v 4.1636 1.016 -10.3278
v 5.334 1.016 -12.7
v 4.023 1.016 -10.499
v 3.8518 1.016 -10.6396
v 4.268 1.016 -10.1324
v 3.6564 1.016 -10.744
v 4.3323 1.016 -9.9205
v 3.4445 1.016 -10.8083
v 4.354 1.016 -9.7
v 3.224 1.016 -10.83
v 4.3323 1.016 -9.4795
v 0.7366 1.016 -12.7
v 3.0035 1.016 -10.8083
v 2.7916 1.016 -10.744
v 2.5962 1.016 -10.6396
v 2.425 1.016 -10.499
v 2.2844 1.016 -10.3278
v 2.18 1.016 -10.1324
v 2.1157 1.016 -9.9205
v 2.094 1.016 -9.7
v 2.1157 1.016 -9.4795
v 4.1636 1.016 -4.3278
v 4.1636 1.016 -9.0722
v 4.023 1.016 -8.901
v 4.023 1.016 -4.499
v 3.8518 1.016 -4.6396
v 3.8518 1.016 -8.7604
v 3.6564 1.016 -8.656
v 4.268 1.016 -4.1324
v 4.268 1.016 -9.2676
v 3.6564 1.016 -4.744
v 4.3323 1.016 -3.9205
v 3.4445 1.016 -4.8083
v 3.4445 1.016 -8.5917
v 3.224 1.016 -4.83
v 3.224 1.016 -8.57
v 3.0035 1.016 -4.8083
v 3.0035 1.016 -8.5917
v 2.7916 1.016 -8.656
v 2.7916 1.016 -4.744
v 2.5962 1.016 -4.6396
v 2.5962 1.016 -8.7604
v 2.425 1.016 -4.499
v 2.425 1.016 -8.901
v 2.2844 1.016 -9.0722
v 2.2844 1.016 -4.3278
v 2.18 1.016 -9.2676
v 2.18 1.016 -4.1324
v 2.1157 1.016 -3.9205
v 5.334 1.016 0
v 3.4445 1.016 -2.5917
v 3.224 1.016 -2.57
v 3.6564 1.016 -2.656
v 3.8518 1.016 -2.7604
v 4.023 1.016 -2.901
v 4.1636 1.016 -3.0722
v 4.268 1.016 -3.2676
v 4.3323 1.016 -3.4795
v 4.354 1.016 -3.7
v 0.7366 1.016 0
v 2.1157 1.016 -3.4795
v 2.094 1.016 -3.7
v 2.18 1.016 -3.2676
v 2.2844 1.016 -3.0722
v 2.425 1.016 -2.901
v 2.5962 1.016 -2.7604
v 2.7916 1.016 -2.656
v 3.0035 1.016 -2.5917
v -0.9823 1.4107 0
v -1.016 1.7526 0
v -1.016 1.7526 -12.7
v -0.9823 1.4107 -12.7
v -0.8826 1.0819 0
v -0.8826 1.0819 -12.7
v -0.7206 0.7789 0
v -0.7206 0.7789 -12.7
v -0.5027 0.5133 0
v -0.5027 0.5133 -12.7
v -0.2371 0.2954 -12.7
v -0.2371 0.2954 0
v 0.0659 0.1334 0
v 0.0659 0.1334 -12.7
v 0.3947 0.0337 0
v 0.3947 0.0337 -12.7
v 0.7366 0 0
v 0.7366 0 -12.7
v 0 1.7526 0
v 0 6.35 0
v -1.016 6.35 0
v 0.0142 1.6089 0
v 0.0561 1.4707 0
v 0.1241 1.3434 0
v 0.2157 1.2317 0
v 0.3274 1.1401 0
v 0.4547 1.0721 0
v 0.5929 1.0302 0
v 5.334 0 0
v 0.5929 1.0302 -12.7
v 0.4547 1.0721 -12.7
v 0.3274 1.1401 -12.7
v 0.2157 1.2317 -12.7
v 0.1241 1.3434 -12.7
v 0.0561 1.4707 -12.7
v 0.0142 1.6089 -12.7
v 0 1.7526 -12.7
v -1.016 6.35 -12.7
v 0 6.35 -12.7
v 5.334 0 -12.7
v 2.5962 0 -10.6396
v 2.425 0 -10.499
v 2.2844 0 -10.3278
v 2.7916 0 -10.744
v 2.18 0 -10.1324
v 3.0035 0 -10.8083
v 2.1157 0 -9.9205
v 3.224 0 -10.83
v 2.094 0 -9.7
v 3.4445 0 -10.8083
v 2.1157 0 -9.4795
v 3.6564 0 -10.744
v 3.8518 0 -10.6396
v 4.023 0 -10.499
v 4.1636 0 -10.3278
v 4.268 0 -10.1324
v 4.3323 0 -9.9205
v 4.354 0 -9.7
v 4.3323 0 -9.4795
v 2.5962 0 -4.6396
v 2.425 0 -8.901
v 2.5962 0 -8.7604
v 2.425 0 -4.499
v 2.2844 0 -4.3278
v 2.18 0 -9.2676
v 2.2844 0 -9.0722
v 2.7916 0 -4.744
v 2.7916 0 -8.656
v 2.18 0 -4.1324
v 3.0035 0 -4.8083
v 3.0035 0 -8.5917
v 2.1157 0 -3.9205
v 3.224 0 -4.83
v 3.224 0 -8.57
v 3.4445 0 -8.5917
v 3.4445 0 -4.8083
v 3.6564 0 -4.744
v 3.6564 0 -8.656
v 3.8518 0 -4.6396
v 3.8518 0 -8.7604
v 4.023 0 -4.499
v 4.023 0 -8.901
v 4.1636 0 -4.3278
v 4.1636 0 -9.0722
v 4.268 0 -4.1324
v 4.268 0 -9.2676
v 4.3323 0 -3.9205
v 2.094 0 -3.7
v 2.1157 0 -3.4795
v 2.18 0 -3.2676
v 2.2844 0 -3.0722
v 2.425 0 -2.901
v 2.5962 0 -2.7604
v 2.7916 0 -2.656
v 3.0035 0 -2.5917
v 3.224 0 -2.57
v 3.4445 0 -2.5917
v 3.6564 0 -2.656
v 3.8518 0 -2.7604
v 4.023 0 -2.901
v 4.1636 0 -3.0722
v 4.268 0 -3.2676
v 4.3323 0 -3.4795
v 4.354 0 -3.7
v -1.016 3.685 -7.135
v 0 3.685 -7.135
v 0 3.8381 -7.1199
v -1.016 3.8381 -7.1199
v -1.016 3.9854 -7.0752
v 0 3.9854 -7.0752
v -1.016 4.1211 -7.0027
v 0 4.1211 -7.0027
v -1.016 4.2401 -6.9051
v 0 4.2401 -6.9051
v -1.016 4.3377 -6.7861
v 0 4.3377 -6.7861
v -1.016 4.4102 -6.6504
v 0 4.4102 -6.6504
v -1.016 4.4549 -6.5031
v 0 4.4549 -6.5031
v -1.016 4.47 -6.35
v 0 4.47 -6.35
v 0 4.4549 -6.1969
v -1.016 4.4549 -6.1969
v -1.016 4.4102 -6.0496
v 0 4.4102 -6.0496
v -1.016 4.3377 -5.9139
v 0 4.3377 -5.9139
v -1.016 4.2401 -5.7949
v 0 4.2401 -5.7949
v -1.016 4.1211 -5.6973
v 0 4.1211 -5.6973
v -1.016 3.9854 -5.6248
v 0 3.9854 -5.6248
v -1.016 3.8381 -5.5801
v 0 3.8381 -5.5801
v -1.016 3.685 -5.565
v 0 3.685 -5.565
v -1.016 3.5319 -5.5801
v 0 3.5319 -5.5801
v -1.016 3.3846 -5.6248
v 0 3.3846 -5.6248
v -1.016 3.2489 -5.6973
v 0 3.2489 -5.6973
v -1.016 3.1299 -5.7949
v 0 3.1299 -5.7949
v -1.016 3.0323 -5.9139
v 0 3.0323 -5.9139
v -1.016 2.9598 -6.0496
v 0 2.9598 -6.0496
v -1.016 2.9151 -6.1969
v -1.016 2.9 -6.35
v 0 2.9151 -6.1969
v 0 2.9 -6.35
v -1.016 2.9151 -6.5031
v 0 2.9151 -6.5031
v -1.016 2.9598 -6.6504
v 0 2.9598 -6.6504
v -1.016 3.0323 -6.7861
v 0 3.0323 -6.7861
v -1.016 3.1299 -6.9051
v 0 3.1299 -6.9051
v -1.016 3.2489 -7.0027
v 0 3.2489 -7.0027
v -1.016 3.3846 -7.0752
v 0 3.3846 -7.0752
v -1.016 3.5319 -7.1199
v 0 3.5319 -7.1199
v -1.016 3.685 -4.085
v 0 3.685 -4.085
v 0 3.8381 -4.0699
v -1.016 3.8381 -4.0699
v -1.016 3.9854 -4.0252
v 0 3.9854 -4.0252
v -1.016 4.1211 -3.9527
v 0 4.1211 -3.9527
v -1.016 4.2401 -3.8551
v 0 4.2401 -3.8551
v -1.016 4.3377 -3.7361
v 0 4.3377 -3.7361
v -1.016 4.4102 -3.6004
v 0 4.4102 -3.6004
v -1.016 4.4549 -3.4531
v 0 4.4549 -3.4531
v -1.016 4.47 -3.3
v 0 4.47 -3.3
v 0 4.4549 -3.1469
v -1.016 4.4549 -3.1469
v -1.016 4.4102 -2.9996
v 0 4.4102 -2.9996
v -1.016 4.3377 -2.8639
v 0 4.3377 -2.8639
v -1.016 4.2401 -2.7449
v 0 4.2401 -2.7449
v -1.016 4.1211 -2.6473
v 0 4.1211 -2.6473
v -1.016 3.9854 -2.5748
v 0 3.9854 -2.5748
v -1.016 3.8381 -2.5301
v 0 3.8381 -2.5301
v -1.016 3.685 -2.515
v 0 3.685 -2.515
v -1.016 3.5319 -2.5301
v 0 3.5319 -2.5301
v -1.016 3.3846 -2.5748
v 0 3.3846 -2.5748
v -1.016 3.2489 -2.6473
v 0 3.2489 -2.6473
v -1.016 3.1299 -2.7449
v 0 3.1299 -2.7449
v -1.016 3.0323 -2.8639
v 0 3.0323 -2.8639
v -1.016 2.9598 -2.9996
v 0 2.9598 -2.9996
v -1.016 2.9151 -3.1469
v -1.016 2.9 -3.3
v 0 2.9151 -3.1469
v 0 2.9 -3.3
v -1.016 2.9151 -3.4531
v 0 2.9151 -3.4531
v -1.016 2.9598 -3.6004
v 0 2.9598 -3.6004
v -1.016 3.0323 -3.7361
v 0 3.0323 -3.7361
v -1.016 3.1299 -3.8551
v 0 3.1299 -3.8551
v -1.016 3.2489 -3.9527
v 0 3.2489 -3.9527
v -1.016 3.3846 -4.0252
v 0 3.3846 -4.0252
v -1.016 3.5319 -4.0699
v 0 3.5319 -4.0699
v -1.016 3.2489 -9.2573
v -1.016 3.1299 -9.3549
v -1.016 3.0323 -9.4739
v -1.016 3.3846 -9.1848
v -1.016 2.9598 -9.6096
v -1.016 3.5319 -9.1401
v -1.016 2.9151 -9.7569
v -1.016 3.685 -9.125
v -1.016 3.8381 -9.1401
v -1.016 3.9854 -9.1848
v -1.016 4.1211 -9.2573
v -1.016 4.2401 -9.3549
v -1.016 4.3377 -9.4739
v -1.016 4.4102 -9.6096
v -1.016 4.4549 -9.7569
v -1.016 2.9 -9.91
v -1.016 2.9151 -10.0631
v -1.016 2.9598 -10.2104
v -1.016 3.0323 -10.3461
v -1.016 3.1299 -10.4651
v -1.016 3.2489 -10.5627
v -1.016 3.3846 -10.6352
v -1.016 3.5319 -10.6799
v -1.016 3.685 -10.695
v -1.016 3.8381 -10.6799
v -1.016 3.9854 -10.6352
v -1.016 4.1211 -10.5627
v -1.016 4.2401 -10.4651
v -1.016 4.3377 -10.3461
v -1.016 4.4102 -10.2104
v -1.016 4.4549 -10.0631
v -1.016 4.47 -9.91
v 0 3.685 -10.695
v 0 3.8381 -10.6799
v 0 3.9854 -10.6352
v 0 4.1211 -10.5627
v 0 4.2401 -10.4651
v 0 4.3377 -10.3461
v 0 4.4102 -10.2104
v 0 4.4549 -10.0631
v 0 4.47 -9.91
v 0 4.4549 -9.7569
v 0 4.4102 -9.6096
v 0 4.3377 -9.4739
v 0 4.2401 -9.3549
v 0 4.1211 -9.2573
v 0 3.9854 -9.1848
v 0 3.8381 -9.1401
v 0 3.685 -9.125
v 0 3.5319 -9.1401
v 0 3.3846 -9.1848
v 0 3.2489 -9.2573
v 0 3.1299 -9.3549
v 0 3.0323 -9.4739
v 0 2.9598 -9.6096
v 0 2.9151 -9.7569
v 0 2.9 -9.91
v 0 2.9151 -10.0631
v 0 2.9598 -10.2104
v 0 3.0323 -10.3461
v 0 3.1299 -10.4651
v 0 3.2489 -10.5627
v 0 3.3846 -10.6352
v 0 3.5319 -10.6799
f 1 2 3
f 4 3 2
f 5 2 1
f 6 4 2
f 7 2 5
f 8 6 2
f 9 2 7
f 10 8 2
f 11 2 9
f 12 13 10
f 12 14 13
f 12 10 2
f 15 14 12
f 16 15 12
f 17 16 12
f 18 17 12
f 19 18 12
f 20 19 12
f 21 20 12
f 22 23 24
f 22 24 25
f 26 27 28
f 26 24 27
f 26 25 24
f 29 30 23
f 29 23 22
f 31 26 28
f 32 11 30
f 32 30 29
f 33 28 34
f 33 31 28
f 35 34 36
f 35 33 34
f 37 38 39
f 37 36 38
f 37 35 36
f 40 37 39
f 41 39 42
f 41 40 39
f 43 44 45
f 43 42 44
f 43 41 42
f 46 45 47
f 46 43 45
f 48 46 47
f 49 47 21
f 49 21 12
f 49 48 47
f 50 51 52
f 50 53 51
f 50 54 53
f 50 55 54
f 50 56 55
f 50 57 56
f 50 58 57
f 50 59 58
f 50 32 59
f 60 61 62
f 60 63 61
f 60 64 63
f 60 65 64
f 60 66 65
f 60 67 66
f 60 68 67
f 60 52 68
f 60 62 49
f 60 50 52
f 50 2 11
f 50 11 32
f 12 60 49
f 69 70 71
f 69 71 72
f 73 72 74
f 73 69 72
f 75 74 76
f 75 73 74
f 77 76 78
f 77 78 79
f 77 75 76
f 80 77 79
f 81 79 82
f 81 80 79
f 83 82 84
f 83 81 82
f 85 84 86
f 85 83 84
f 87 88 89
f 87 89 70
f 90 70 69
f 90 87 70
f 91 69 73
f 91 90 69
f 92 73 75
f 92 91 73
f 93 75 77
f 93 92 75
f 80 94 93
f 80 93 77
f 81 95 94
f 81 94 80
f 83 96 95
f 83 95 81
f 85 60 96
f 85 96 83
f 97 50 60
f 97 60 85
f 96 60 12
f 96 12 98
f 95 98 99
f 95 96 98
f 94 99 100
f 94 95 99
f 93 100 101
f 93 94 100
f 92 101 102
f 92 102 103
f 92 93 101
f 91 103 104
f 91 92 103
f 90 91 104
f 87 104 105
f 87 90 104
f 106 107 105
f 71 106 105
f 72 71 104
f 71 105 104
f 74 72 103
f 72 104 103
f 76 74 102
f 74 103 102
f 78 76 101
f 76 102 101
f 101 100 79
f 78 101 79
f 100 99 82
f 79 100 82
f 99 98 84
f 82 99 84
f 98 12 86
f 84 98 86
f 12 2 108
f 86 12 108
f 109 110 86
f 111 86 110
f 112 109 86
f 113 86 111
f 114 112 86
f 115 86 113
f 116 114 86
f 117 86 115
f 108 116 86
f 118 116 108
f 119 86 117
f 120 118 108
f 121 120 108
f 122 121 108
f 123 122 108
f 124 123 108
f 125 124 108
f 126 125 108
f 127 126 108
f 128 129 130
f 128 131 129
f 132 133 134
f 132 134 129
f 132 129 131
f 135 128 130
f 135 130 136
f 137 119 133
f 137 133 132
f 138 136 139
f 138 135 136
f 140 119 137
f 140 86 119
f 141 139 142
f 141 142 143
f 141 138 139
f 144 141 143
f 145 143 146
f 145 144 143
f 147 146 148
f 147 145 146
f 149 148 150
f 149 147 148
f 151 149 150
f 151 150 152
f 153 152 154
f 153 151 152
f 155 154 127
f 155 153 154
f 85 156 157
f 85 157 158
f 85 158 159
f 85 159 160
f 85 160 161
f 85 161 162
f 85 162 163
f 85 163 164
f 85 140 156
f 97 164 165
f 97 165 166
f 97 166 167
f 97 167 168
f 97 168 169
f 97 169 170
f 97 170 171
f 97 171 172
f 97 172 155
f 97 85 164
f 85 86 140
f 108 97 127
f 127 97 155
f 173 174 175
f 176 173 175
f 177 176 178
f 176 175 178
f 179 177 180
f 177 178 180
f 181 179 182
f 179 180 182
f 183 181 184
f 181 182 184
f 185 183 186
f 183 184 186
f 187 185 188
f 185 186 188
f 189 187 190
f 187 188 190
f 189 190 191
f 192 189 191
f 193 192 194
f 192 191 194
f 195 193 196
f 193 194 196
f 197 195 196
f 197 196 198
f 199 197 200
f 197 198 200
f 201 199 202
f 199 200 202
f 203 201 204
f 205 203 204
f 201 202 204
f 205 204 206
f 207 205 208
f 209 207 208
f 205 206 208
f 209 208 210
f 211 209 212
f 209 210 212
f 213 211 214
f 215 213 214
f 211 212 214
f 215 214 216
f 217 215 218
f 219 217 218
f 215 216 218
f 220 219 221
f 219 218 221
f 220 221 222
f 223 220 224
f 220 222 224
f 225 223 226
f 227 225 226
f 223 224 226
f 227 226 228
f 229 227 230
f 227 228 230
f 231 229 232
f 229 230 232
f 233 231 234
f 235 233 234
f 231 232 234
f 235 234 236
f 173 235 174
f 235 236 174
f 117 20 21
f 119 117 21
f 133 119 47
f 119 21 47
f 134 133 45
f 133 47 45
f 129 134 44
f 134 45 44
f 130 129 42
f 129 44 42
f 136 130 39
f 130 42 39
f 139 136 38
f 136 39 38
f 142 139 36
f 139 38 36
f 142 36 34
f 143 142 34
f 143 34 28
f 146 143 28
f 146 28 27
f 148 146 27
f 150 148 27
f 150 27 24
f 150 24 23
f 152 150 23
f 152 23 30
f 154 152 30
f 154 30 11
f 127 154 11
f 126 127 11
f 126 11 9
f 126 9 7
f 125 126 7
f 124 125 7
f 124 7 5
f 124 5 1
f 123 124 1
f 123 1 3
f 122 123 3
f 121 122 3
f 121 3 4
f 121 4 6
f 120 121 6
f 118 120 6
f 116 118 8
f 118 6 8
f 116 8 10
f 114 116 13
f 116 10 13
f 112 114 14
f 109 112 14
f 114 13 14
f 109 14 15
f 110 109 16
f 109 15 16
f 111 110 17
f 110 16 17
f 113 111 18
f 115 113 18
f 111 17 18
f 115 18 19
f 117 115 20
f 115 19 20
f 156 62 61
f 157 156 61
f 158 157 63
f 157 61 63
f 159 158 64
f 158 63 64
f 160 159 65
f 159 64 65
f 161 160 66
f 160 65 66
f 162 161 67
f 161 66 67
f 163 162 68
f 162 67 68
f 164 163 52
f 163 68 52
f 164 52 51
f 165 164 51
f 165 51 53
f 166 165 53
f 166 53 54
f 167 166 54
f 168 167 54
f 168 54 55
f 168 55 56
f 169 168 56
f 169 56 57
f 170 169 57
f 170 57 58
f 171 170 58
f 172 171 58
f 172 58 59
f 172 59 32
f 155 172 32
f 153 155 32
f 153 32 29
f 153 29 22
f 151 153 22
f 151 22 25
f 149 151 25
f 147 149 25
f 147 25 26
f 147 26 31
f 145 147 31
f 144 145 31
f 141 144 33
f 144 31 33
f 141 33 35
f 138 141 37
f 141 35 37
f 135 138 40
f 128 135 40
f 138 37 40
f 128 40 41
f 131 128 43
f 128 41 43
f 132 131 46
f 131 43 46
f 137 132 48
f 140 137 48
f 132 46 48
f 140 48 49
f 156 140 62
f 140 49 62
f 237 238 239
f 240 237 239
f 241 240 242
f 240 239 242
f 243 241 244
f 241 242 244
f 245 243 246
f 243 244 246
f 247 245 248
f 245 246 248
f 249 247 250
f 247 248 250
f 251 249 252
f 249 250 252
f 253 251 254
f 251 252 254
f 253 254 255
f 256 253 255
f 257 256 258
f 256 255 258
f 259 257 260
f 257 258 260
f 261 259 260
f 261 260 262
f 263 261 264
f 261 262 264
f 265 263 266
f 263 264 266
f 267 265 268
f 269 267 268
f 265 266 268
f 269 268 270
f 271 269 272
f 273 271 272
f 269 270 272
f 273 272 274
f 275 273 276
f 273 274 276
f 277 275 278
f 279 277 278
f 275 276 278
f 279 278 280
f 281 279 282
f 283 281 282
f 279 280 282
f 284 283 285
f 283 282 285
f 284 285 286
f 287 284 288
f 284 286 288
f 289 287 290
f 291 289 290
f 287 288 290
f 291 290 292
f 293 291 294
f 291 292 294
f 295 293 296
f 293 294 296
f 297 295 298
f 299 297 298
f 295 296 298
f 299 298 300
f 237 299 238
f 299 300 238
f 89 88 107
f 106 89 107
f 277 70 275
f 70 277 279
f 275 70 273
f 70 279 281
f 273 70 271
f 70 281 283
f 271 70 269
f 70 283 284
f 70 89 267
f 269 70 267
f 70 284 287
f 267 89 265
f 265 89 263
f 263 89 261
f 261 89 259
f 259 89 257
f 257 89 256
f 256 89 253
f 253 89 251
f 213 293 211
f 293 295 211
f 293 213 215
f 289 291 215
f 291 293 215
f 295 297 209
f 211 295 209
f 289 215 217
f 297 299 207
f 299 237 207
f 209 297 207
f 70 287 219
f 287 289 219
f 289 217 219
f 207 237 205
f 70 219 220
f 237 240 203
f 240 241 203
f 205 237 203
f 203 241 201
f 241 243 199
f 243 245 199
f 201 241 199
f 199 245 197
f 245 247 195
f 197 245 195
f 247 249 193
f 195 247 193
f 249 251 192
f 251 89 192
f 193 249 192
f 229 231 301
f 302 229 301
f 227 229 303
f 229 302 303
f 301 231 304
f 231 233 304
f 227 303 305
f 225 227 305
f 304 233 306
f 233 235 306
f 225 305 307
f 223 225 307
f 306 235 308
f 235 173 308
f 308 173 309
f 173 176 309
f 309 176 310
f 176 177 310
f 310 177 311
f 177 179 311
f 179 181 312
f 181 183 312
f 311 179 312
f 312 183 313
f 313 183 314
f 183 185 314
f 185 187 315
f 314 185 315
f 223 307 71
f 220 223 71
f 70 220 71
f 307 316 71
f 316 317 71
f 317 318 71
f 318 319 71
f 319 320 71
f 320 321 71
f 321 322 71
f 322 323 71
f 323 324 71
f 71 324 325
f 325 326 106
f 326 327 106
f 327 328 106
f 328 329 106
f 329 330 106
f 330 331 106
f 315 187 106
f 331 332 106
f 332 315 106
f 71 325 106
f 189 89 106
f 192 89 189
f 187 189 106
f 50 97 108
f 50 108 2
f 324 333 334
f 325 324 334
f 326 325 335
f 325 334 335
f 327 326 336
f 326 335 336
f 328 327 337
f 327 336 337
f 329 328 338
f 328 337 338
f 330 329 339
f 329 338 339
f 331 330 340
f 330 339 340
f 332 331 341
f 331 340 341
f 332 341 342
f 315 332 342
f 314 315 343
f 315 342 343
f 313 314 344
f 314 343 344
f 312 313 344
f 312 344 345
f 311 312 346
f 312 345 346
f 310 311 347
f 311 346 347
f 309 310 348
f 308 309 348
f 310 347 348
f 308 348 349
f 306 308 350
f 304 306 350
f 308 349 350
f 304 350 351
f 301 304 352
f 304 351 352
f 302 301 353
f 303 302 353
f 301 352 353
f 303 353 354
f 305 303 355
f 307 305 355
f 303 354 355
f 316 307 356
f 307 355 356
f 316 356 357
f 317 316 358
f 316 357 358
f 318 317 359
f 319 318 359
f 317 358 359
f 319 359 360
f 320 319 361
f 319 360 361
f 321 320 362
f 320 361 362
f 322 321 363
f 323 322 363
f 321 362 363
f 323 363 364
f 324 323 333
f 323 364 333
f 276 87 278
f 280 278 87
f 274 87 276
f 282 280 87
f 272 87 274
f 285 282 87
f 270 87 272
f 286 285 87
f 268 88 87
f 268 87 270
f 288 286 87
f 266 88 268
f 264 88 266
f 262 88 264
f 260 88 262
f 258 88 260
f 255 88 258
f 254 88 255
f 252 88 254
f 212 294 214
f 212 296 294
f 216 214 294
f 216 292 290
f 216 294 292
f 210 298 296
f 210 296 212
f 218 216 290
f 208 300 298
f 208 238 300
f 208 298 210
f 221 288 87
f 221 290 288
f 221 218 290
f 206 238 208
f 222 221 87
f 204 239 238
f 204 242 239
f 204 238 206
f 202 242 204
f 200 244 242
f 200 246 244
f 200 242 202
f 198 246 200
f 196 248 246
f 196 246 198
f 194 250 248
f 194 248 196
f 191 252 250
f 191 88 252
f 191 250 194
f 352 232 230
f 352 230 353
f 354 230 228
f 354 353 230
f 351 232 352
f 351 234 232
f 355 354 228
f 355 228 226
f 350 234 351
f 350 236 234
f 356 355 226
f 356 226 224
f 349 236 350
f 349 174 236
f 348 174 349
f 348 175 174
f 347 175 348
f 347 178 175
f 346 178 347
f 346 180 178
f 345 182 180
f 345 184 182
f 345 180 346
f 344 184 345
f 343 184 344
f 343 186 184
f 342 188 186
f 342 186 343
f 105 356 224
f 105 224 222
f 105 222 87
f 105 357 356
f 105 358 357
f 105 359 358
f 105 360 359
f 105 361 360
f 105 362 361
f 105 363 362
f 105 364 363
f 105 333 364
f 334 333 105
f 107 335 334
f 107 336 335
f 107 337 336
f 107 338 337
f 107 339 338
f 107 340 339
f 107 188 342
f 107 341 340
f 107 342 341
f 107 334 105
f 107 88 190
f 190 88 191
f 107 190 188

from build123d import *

# Parameters (mm, degrees)
SKETCH1_W                    = 12.7
SKETCH1_H                    = 6.35
SKETCH1_R                    = 0.785
BASE_FLANGE1_DEPTH           = 1.016
EDGE_FLANGE1_STRIP_W         = 5.5372
EDGE_FLANGE1_STRIP_H         = 1.016
EDGE_FLANGE1_STRIP_CUT_DEPTH = 12.7
EDGE_FLANGE1_DEPTH           = 12.7
CUT_EXTRUDE1_REACH           = 16.771
SKETCH9_R                    = 1.13


# Sheet-metal steps are written as plain solids
with BuildPart() as part:
    # Sketch1 → Base-Flange1 (new body)
    with BuildSketch(Plane(origin=(0, 0, 0), x_dir=(0, 0, -1), z_dir=(1, 0, 0))):
        with Locations((6.35, 3.175)):
            Rectangle(SKETCH1_W, SKETCH1_H)
        with Locations((3.3, 3.685)):
            Circle(SKETCH1_R, mode=Mode.SUBTRACT)
        with Locations((6.35, 3.685)):
            Circle(SKETCH1_R, mode=Mode.SUBTRACT)
        with Locations((9.91, 3.685)):
            Circle(SKETCH1_R, mode=Mode.SUBTRACT)
    extrude(amount=-BASE_FLANGE1_DEPTH)

    # Edge-Flange1 strip (across the edge) → Edge-Flange1 strip cut (cut)
    with BuildSketch(Plane.YX):
        with Locations((-1.016, -0.508)):
            Rectangle(EDGE_FLANGE1_STRIP_W, EDGE_FLANGE1_STRIP_H)
    extrude(amount=EDGE_FLANGE1_STRIP_CUT_DEPTH, mode=Mode.SUBTRACT)

    # Edge-Flange1 section (across the edge) → Edge-Flange1 (add)
    with BuildSketch(Plane.YX):
        with BuildLine():
            Line((0, 0.7366), (0, 5.334))
            Line((0, 5.334), (1.016, 5.334))
            Line((1.016, 5.334), (1.016, 0.7366))
            ThreePointArc((1.016, 0.7366), (1.231745145, 0.215745145), (1.7526, 0))
            Line((1.7526, 0), (1.7526, -1.016))
            ThreePointArc((1.7526, -1.016), (0.513324655, -0.502675345), (0, 0.7366))
        make_face()
    extrude(amount=EDGE_FLANGE1_DEPTH)

    # Sketch9 → Cut-Extrude1 (cut, up to next)
    with BuildSketch(Plane(origin=(0, 1.016, 0), x_dir=(1, 0, 0), z_dir=(0, 1, 0)), mode=Mode.PRIVATE) as cut_extrude1_sk1:
        with Locations(Location((3.224, 3.7, 0), (0, 0, 180))):
            Circle(SKETCH9_R)
    cut_extrude1_tool1 = extrude(cut_extrude1_sk1.sketch, amount=-CUT_EXTRUDE1_REACH, mode=Mode.PRIVATE) & part.part
    # Sketch9 → Cut-Extrude1 (cut, up to next)
    with BuildSketch(Plane(origin=(0, 1.016, 0), x_dir=(1, 0, 0), z_dir=(0, 1, 0)), mode=Mode.PRIVATE) as cut_extrude1_sk2:
        with Locations(Location((3.224, 9.7, 0), (0, 0, 180))):
            Circle(SKETCH9_R)
    cut_extrude1_tool2 = extrude(cut_extrude1_sk2.sketch, amount=-CUT_EXTRUDE1_REACH, mode=Mode.PRIVATE) & part.part
    add(cut_extrude1_tool1.solids().sort_by_distance((3.224, 1.016, -3.7))[0], mode=Mode.SUBTRACT)
    add(cut_extrude1_tool2.solids().sort_by_distance((3.224, 1.016, -9.7))[0], mode=Mode.SUBTRACT)


solid = part.part
